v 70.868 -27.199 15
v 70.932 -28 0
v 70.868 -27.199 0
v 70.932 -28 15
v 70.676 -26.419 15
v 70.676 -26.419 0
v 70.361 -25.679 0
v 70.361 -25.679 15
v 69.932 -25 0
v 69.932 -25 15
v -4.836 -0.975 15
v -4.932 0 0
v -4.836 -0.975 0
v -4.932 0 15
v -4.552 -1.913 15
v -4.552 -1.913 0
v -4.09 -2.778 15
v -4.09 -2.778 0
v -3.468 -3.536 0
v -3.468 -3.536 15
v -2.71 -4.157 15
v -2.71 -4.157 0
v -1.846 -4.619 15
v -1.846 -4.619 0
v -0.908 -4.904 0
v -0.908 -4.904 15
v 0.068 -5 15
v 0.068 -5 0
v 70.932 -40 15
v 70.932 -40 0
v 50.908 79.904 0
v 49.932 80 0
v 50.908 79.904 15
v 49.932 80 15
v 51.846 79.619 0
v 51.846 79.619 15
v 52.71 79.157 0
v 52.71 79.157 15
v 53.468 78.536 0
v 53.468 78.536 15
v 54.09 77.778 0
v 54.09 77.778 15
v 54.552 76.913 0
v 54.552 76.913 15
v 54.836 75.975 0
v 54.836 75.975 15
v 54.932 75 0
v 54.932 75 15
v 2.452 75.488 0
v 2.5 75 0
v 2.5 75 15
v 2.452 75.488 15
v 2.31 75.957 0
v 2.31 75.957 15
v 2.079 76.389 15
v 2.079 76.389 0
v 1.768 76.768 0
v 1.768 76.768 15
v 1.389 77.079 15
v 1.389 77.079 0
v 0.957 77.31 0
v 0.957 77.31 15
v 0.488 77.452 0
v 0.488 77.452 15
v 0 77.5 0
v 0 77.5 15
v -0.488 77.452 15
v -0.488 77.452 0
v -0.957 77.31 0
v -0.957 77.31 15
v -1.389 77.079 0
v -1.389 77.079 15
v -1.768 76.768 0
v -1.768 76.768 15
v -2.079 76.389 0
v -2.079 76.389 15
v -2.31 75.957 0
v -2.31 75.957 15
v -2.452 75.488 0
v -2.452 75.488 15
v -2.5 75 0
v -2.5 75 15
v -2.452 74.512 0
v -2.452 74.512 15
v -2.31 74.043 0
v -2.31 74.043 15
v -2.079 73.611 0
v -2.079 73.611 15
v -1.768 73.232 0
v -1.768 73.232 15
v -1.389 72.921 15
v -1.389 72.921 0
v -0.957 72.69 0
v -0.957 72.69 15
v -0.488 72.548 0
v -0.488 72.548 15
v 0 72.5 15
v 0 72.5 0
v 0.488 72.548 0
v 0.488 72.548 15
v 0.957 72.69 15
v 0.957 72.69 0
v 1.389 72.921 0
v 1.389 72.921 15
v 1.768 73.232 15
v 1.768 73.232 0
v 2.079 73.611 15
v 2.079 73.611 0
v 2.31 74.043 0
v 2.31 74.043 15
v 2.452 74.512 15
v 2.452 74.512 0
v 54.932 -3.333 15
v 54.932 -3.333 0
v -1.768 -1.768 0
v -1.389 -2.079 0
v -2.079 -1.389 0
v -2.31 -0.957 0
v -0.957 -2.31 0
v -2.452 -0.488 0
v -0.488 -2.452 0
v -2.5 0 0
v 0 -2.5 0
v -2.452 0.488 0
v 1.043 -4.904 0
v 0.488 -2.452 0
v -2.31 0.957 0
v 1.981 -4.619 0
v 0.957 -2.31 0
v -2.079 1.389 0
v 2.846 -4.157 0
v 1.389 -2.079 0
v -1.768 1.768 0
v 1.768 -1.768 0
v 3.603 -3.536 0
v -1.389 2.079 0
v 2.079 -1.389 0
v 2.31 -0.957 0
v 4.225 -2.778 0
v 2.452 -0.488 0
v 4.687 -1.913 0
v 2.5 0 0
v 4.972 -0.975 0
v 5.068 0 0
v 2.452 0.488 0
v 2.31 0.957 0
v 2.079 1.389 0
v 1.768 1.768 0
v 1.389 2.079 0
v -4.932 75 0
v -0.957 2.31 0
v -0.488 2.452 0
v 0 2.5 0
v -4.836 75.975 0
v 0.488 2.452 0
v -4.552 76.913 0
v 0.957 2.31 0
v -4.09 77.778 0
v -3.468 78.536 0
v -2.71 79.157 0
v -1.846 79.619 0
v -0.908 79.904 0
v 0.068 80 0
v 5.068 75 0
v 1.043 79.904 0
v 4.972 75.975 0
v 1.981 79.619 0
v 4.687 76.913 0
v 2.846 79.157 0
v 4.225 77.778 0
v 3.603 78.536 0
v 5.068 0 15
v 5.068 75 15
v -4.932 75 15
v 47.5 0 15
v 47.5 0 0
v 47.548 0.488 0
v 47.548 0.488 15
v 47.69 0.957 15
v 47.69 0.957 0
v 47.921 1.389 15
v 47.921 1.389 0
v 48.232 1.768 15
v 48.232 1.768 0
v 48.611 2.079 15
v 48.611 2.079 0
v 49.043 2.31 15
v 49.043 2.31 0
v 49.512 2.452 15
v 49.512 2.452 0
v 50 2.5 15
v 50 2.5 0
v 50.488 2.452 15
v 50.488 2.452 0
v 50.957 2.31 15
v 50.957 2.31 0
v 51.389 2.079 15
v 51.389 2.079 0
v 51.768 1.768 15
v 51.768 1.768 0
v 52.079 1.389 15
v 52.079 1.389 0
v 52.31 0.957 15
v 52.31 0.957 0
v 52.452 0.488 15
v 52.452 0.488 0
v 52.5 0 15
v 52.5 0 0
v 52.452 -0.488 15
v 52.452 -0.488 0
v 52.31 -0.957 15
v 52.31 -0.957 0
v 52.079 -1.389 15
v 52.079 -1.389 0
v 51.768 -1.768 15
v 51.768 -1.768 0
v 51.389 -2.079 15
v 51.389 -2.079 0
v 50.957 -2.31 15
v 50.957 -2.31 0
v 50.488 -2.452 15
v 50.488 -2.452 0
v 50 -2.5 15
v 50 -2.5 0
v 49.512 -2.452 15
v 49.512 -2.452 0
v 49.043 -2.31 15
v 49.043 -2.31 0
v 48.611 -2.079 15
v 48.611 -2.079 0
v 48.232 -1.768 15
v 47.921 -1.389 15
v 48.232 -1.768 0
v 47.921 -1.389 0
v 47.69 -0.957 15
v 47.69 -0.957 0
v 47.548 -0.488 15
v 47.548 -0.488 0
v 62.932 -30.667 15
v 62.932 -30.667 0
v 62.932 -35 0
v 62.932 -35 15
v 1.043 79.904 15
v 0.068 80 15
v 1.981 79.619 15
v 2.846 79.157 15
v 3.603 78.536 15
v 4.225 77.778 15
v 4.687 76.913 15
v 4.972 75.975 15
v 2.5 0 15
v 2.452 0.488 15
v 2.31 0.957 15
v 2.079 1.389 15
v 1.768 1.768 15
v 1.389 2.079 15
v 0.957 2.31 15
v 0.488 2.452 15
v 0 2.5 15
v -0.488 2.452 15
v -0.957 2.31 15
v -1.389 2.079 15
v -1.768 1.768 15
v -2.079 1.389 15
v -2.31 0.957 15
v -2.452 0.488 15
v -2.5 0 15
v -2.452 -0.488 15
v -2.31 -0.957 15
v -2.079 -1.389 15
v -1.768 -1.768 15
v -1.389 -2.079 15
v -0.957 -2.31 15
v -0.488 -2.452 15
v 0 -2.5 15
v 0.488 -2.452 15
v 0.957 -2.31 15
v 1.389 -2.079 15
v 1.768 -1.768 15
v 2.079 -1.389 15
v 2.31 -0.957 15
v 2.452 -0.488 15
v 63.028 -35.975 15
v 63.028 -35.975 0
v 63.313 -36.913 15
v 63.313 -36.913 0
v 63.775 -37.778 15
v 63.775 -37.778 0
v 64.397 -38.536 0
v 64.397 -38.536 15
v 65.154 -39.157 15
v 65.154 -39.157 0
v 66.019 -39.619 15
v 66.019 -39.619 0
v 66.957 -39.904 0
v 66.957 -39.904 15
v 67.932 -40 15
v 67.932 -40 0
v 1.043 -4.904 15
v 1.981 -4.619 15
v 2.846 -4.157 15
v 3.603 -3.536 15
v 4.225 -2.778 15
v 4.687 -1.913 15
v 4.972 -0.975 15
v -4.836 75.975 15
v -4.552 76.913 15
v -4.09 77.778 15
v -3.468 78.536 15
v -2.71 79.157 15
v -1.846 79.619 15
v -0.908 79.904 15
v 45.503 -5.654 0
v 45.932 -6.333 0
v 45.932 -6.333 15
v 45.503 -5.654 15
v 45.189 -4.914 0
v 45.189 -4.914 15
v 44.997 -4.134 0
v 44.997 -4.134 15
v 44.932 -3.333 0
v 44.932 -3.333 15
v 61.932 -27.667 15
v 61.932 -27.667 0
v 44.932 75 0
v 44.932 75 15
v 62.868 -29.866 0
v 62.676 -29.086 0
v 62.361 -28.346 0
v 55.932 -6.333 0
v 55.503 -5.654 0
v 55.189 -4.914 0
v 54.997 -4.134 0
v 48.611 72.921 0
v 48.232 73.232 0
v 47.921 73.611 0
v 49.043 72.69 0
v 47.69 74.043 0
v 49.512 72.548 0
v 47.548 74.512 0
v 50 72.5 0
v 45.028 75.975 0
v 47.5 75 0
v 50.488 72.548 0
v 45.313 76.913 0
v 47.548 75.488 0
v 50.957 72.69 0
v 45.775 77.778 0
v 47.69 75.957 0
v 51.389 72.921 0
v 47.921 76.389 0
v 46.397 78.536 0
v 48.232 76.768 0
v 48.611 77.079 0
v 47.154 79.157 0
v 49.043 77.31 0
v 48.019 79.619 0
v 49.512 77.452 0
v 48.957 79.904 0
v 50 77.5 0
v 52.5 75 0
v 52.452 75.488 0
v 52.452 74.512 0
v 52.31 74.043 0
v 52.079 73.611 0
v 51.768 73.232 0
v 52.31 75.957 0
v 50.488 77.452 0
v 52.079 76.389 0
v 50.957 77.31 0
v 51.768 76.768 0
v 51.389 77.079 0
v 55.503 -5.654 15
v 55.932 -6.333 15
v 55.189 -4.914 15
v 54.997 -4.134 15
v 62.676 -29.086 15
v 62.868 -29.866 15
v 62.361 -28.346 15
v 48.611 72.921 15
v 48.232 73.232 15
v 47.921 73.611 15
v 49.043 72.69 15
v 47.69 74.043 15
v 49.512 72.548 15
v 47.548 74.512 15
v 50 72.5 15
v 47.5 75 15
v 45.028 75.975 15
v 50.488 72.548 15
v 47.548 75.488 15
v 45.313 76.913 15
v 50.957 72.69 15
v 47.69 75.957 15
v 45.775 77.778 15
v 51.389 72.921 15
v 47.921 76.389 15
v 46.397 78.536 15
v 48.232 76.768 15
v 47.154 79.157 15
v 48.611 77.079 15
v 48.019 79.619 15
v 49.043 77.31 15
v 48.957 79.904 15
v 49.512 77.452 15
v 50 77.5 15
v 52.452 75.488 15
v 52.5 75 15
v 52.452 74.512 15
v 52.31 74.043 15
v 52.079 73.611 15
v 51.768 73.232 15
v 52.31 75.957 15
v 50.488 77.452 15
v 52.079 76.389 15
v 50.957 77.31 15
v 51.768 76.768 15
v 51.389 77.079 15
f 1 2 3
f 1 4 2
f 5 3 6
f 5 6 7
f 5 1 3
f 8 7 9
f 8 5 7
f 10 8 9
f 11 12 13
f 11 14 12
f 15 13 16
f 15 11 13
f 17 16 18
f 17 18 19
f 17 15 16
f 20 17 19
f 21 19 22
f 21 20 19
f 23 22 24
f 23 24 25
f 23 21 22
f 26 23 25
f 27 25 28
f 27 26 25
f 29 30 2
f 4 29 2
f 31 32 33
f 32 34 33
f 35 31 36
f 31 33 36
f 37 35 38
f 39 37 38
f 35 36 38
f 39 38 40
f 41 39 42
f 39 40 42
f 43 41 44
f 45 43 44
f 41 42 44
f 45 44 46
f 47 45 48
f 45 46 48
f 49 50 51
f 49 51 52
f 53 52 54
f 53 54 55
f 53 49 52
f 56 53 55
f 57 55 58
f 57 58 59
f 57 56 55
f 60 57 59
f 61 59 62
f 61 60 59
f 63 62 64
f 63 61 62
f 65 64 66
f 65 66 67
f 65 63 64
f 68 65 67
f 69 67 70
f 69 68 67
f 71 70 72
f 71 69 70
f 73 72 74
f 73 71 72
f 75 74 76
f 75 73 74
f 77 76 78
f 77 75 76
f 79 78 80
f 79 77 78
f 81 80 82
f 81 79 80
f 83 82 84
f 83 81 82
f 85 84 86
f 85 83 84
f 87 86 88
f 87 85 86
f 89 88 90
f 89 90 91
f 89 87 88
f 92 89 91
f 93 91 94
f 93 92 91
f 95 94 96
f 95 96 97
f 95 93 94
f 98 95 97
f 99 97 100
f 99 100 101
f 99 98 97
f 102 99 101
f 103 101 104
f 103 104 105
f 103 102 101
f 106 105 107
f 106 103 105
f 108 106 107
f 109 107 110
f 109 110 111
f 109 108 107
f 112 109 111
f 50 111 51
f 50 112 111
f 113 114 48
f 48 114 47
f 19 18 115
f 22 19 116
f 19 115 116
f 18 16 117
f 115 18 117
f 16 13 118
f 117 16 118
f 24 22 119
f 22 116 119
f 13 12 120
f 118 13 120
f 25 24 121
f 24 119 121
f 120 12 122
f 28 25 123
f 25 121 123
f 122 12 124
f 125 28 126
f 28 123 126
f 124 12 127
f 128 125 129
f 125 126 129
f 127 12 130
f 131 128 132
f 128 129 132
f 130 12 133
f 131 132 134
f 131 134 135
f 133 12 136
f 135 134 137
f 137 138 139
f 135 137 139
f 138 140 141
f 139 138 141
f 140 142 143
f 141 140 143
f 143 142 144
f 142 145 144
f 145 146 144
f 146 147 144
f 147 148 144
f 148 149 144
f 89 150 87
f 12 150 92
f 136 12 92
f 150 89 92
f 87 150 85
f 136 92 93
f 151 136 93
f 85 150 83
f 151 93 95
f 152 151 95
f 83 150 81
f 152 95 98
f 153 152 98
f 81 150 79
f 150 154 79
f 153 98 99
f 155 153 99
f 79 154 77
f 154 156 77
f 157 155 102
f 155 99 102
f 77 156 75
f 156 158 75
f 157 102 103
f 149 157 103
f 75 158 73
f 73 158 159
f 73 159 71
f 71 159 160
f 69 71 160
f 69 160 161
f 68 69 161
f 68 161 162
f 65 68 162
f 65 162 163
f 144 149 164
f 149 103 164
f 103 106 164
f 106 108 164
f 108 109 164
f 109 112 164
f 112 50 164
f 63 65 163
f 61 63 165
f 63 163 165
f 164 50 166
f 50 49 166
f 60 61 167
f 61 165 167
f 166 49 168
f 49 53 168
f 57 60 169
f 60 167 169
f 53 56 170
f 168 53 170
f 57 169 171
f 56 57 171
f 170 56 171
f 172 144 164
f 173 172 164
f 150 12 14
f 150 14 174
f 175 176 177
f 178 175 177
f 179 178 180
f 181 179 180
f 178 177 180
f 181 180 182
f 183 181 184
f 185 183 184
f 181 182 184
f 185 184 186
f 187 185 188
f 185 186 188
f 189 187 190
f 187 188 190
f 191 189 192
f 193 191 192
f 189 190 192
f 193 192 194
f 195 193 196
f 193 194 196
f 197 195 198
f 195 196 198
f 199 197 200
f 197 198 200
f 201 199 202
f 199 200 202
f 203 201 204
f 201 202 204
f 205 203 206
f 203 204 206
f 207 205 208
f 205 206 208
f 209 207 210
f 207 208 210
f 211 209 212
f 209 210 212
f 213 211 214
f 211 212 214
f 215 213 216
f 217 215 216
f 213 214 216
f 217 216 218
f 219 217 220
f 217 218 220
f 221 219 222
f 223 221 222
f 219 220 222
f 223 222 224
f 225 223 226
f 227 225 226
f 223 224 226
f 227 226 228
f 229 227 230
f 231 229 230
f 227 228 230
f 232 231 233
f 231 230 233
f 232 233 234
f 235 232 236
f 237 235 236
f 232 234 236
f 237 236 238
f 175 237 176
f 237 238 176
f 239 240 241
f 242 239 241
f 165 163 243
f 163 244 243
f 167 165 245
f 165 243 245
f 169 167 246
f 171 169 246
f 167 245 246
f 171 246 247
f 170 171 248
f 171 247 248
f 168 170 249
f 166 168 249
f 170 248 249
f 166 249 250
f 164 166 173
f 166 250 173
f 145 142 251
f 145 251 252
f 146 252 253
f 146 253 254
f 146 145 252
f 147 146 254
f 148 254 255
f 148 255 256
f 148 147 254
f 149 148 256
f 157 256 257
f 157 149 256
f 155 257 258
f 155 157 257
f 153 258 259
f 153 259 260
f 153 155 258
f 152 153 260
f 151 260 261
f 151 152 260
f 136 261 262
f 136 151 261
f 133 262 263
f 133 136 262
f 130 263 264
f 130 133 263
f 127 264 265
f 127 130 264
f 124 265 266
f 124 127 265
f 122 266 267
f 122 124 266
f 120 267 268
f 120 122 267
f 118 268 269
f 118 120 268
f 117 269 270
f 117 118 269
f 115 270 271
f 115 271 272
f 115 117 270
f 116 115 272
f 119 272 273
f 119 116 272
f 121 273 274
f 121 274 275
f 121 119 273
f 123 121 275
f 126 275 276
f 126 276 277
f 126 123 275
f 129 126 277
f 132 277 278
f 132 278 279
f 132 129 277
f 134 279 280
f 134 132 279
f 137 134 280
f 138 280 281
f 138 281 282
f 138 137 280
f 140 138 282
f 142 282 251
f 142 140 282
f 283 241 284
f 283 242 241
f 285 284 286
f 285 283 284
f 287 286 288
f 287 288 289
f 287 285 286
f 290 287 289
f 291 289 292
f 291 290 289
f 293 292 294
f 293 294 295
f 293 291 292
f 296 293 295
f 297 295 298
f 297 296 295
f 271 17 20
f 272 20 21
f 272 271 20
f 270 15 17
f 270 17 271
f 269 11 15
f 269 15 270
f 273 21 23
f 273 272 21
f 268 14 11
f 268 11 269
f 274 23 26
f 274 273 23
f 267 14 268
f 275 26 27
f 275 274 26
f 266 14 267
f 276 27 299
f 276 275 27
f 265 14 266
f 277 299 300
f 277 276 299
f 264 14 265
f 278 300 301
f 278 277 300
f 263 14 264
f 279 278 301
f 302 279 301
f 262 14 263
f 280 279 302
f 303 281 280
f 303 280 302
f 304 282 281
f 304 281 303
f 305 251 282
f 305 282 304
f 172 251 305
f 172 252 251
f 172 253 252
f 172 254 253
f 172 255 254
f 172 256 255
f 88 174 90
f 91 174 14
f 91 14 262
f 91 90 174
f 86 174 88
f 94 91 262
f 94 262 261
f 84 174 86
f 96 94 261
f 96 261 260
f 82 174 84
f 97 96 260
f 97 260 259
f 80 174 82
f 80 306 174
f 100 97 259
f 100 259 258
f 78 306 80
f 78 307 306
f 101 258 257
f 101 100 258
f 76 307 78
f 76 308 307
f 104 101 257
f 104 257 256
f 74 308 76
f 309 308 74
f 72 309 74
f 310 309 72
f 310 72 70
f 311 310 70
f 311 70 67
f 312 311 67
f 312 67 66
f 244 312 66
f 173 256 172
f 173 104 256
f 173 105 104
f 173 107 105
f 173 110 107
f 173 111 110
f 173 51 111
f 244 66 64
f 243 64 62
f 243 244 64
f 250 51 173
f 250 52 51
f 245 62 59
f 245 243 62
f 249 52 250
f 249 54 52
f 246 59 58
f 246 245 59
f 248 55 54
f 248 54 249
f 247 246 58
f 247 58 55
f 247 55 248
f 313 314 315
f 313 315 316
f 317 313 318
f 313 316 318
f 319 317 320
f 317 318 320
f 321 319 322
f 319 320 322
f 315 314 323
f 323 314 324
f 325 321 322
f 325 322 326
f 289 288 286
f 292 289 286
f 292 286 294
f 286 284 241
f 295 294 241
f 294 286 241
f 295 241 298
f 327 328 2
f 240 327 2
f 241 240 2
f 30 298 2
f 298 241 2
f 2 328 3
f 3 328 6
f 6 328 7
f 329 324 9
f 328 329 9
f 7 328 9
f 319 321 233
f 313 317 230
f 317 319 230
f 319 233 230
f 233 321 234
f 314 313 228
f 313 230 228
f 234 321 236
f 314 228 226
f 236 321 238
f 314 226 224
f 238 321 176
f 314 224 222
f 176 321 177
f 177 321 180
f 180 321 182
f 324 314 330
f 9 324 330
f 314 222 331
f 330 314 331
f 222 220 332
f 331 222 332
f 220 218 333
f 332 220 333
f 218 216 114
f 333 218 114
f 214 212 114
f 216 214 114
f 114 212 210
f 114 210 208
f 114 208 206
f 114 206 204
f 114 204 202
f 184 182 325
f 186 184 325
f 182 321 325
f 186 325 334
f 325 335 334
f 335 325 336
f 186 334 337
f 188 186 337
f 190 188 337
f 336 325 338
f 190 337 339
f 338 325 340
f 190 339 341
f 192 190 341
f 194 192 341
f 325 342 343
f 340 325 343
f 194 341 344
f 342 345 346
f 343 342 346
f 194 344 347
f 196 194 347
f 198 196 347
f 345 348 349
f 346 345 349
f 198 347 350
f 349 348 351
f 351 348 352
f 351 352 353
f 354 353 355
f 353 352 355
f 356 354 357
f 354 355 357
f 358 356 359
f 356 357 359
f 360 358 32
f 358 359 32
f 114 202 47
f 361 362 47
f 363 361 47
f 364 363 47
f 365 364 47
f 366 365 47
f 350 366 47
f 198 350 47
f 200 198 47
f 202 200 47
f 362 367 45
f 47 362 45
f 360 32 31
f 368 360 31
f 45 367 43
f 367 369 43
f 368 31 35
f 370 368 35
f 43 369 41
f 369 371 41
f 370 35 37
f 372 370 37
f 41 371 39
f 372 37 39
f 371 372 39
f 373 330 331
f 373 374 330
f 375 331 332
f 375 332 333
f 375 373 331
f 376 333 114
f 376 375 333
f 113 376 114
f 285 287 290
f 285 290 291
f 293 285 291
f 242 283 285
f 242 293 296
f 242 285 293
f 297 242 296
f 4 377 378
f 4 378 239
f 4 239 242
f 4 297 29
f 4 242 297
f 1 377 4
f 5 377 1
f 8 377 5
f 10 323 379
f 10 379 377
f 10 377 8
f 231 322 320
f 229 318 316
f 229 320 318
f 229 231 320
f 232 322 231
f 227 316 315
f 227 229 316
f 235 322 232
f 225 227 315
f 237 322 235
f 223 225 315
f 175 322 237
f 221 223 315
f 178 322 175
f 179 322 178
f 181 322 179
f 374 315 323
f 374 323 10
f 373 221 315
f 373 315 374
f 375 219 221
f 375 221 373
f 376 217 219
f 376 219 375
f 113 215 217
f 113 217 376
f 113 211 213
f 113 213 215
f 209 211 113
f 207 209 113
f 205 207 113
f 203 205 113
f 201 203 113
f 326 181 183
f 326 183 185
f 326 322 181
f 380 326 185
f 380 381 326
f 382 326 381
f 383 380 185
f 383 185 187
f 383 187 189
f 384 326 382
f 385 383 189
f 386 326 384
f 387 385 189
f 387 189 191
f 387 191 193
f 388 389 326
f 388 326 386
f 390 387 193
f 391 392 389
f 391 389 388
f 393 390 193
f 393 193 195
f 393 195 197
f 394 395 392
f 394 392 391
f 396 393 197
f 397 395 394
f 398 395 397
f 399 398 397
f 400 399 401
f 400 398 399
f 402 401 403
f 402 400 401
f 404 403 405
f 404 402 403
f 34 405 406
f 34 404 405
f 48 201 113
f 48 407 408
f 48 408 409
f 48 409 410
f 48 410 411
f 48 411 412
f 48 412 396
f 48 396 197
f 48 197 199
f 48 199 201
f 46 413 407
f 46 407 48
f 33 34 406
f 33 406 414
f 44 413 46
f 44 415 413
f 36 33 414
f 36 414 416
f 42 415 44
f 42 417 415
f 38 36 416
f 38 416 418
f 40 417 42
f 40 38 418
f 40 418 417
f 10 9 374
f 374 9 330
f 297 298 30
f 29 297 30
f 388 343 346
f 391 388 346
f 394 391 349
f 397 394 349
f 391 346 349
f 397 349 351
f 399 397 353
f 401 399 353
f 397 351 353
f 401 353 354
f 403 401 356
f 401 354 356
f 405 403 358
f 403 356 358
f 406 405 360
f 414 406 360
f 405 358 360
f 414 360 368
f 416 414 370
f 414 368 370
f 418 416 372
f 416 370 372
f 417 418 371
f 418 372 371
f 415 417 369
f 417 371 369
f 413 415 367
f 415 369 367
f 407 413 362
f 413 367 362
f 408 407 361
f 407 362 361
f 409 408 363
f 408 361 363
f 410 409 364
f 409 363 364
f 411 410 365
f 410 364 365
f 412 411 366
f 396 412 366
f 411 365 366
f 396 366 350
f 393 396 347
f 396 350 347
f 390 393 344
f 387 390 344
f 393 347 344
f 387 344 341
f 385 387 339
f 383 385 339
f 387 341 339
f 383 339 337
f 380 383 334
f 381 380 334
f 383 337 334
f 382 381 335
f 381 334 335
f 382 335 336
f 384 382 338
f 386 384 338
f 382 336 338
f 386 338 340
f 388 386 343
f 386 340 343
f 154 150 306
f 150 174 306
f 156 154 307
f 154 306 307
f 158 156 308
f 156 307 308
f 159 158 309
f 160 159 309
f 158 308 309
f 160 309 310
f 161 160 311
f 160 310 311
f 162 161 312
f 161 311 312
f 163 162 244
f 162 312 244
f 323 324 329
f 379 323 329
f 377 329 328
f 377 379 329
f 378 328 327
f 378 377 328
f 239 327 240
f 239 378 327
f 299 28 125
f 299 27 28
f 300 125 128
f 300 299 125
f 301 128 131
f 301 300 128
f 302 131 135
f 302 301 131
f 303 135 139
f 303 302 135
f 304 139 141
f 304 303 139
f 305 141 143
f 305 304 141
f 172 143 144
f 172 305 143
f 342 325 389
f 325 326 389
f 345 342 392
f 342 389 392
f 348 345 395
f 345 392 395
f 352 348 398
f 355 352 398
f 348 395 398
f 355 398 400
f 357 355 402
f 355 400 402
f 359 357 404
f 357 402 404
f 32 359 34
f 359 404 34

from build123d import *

# Parameters (mm, degrees)
F0_W     = 10
F0_H     = 85
F0_R     = 2.5
F1_DEPTH = 15
F5_DEPTH = 15
F6_R     = 4.99999
F6_2_R   = 4.99999


# Not quite as in the source:
# - a fillet or chamfer is up to 0.001 mm smaller than in the source, because OpenCascade refuses the exact size


with BuildPart() as f1:
    # F0 (on Top) → F1 (new body)
    with BuildSketch(Plane.XY):
        with Locations((0.0677526742, 37.5)):
            Rectangle(F0_W, F0_H)
        Circle(F0_R, mode=Mode.SUBTRACT)
        with Locations((0, 75)):
            Circle(F0_R, mode=Mode.SUBTRACT)
    extrude(amount=F1_DEPTH)


with BuildPart() as f3_1:
    # F3: instance of F1
    add(f1.part.mirror(Plane.YZ.offset(25)))

    # F4 (on Top) → F5 (join)
    with BuildSketch(Plane.XY):
        Polygon((54.9322473258, -5), (44.9322473258, -5), (62.9322473258, -29), (62.9322473258, -40), (70.9322473258, -40), (70.9322473258, -26.3333333333), align=None)
    extrude(amount=F5_DEPTH)

    # F6#2 (radius 5 in the source; OpenCascade refuses exactly that, so slightly less here)
    f6_2_edges = [f3_1.edges().sort_by_distance(p)[0] for p in [
        (44.932247, -5, 7.5),
        (70.932247, -26.333333, 7.5),
        (62.932247, -29, 7.5),
        (54.932247, -5, 7.5),
        (54.932247, 80, 7.5),
        (44.932247, 80, 7.5),
        (62.932247, -40, 7.5),
    ]]
    fillet(f6_2_edges, radius=F6_2_R)


with BuildPart() as f1_1:
    add(f1.part)

    # F6 (radius 5 in the source; OpenCascade refuses exactly that, so slightly less here)
    f6_edges = [f1_1.edges().sort_by_distance(p)[0] for p in [
        (5.067753, -5, 7.5),
        (-4.932247, -5, 7.5),
        (5.067753, 80, 7.5),
        (-4.932247, 80, 7.5),
    ]]
    fillet(f6_edges, radius=F6_R)


solid = Compound([f3_1.part, f1_1.part])
